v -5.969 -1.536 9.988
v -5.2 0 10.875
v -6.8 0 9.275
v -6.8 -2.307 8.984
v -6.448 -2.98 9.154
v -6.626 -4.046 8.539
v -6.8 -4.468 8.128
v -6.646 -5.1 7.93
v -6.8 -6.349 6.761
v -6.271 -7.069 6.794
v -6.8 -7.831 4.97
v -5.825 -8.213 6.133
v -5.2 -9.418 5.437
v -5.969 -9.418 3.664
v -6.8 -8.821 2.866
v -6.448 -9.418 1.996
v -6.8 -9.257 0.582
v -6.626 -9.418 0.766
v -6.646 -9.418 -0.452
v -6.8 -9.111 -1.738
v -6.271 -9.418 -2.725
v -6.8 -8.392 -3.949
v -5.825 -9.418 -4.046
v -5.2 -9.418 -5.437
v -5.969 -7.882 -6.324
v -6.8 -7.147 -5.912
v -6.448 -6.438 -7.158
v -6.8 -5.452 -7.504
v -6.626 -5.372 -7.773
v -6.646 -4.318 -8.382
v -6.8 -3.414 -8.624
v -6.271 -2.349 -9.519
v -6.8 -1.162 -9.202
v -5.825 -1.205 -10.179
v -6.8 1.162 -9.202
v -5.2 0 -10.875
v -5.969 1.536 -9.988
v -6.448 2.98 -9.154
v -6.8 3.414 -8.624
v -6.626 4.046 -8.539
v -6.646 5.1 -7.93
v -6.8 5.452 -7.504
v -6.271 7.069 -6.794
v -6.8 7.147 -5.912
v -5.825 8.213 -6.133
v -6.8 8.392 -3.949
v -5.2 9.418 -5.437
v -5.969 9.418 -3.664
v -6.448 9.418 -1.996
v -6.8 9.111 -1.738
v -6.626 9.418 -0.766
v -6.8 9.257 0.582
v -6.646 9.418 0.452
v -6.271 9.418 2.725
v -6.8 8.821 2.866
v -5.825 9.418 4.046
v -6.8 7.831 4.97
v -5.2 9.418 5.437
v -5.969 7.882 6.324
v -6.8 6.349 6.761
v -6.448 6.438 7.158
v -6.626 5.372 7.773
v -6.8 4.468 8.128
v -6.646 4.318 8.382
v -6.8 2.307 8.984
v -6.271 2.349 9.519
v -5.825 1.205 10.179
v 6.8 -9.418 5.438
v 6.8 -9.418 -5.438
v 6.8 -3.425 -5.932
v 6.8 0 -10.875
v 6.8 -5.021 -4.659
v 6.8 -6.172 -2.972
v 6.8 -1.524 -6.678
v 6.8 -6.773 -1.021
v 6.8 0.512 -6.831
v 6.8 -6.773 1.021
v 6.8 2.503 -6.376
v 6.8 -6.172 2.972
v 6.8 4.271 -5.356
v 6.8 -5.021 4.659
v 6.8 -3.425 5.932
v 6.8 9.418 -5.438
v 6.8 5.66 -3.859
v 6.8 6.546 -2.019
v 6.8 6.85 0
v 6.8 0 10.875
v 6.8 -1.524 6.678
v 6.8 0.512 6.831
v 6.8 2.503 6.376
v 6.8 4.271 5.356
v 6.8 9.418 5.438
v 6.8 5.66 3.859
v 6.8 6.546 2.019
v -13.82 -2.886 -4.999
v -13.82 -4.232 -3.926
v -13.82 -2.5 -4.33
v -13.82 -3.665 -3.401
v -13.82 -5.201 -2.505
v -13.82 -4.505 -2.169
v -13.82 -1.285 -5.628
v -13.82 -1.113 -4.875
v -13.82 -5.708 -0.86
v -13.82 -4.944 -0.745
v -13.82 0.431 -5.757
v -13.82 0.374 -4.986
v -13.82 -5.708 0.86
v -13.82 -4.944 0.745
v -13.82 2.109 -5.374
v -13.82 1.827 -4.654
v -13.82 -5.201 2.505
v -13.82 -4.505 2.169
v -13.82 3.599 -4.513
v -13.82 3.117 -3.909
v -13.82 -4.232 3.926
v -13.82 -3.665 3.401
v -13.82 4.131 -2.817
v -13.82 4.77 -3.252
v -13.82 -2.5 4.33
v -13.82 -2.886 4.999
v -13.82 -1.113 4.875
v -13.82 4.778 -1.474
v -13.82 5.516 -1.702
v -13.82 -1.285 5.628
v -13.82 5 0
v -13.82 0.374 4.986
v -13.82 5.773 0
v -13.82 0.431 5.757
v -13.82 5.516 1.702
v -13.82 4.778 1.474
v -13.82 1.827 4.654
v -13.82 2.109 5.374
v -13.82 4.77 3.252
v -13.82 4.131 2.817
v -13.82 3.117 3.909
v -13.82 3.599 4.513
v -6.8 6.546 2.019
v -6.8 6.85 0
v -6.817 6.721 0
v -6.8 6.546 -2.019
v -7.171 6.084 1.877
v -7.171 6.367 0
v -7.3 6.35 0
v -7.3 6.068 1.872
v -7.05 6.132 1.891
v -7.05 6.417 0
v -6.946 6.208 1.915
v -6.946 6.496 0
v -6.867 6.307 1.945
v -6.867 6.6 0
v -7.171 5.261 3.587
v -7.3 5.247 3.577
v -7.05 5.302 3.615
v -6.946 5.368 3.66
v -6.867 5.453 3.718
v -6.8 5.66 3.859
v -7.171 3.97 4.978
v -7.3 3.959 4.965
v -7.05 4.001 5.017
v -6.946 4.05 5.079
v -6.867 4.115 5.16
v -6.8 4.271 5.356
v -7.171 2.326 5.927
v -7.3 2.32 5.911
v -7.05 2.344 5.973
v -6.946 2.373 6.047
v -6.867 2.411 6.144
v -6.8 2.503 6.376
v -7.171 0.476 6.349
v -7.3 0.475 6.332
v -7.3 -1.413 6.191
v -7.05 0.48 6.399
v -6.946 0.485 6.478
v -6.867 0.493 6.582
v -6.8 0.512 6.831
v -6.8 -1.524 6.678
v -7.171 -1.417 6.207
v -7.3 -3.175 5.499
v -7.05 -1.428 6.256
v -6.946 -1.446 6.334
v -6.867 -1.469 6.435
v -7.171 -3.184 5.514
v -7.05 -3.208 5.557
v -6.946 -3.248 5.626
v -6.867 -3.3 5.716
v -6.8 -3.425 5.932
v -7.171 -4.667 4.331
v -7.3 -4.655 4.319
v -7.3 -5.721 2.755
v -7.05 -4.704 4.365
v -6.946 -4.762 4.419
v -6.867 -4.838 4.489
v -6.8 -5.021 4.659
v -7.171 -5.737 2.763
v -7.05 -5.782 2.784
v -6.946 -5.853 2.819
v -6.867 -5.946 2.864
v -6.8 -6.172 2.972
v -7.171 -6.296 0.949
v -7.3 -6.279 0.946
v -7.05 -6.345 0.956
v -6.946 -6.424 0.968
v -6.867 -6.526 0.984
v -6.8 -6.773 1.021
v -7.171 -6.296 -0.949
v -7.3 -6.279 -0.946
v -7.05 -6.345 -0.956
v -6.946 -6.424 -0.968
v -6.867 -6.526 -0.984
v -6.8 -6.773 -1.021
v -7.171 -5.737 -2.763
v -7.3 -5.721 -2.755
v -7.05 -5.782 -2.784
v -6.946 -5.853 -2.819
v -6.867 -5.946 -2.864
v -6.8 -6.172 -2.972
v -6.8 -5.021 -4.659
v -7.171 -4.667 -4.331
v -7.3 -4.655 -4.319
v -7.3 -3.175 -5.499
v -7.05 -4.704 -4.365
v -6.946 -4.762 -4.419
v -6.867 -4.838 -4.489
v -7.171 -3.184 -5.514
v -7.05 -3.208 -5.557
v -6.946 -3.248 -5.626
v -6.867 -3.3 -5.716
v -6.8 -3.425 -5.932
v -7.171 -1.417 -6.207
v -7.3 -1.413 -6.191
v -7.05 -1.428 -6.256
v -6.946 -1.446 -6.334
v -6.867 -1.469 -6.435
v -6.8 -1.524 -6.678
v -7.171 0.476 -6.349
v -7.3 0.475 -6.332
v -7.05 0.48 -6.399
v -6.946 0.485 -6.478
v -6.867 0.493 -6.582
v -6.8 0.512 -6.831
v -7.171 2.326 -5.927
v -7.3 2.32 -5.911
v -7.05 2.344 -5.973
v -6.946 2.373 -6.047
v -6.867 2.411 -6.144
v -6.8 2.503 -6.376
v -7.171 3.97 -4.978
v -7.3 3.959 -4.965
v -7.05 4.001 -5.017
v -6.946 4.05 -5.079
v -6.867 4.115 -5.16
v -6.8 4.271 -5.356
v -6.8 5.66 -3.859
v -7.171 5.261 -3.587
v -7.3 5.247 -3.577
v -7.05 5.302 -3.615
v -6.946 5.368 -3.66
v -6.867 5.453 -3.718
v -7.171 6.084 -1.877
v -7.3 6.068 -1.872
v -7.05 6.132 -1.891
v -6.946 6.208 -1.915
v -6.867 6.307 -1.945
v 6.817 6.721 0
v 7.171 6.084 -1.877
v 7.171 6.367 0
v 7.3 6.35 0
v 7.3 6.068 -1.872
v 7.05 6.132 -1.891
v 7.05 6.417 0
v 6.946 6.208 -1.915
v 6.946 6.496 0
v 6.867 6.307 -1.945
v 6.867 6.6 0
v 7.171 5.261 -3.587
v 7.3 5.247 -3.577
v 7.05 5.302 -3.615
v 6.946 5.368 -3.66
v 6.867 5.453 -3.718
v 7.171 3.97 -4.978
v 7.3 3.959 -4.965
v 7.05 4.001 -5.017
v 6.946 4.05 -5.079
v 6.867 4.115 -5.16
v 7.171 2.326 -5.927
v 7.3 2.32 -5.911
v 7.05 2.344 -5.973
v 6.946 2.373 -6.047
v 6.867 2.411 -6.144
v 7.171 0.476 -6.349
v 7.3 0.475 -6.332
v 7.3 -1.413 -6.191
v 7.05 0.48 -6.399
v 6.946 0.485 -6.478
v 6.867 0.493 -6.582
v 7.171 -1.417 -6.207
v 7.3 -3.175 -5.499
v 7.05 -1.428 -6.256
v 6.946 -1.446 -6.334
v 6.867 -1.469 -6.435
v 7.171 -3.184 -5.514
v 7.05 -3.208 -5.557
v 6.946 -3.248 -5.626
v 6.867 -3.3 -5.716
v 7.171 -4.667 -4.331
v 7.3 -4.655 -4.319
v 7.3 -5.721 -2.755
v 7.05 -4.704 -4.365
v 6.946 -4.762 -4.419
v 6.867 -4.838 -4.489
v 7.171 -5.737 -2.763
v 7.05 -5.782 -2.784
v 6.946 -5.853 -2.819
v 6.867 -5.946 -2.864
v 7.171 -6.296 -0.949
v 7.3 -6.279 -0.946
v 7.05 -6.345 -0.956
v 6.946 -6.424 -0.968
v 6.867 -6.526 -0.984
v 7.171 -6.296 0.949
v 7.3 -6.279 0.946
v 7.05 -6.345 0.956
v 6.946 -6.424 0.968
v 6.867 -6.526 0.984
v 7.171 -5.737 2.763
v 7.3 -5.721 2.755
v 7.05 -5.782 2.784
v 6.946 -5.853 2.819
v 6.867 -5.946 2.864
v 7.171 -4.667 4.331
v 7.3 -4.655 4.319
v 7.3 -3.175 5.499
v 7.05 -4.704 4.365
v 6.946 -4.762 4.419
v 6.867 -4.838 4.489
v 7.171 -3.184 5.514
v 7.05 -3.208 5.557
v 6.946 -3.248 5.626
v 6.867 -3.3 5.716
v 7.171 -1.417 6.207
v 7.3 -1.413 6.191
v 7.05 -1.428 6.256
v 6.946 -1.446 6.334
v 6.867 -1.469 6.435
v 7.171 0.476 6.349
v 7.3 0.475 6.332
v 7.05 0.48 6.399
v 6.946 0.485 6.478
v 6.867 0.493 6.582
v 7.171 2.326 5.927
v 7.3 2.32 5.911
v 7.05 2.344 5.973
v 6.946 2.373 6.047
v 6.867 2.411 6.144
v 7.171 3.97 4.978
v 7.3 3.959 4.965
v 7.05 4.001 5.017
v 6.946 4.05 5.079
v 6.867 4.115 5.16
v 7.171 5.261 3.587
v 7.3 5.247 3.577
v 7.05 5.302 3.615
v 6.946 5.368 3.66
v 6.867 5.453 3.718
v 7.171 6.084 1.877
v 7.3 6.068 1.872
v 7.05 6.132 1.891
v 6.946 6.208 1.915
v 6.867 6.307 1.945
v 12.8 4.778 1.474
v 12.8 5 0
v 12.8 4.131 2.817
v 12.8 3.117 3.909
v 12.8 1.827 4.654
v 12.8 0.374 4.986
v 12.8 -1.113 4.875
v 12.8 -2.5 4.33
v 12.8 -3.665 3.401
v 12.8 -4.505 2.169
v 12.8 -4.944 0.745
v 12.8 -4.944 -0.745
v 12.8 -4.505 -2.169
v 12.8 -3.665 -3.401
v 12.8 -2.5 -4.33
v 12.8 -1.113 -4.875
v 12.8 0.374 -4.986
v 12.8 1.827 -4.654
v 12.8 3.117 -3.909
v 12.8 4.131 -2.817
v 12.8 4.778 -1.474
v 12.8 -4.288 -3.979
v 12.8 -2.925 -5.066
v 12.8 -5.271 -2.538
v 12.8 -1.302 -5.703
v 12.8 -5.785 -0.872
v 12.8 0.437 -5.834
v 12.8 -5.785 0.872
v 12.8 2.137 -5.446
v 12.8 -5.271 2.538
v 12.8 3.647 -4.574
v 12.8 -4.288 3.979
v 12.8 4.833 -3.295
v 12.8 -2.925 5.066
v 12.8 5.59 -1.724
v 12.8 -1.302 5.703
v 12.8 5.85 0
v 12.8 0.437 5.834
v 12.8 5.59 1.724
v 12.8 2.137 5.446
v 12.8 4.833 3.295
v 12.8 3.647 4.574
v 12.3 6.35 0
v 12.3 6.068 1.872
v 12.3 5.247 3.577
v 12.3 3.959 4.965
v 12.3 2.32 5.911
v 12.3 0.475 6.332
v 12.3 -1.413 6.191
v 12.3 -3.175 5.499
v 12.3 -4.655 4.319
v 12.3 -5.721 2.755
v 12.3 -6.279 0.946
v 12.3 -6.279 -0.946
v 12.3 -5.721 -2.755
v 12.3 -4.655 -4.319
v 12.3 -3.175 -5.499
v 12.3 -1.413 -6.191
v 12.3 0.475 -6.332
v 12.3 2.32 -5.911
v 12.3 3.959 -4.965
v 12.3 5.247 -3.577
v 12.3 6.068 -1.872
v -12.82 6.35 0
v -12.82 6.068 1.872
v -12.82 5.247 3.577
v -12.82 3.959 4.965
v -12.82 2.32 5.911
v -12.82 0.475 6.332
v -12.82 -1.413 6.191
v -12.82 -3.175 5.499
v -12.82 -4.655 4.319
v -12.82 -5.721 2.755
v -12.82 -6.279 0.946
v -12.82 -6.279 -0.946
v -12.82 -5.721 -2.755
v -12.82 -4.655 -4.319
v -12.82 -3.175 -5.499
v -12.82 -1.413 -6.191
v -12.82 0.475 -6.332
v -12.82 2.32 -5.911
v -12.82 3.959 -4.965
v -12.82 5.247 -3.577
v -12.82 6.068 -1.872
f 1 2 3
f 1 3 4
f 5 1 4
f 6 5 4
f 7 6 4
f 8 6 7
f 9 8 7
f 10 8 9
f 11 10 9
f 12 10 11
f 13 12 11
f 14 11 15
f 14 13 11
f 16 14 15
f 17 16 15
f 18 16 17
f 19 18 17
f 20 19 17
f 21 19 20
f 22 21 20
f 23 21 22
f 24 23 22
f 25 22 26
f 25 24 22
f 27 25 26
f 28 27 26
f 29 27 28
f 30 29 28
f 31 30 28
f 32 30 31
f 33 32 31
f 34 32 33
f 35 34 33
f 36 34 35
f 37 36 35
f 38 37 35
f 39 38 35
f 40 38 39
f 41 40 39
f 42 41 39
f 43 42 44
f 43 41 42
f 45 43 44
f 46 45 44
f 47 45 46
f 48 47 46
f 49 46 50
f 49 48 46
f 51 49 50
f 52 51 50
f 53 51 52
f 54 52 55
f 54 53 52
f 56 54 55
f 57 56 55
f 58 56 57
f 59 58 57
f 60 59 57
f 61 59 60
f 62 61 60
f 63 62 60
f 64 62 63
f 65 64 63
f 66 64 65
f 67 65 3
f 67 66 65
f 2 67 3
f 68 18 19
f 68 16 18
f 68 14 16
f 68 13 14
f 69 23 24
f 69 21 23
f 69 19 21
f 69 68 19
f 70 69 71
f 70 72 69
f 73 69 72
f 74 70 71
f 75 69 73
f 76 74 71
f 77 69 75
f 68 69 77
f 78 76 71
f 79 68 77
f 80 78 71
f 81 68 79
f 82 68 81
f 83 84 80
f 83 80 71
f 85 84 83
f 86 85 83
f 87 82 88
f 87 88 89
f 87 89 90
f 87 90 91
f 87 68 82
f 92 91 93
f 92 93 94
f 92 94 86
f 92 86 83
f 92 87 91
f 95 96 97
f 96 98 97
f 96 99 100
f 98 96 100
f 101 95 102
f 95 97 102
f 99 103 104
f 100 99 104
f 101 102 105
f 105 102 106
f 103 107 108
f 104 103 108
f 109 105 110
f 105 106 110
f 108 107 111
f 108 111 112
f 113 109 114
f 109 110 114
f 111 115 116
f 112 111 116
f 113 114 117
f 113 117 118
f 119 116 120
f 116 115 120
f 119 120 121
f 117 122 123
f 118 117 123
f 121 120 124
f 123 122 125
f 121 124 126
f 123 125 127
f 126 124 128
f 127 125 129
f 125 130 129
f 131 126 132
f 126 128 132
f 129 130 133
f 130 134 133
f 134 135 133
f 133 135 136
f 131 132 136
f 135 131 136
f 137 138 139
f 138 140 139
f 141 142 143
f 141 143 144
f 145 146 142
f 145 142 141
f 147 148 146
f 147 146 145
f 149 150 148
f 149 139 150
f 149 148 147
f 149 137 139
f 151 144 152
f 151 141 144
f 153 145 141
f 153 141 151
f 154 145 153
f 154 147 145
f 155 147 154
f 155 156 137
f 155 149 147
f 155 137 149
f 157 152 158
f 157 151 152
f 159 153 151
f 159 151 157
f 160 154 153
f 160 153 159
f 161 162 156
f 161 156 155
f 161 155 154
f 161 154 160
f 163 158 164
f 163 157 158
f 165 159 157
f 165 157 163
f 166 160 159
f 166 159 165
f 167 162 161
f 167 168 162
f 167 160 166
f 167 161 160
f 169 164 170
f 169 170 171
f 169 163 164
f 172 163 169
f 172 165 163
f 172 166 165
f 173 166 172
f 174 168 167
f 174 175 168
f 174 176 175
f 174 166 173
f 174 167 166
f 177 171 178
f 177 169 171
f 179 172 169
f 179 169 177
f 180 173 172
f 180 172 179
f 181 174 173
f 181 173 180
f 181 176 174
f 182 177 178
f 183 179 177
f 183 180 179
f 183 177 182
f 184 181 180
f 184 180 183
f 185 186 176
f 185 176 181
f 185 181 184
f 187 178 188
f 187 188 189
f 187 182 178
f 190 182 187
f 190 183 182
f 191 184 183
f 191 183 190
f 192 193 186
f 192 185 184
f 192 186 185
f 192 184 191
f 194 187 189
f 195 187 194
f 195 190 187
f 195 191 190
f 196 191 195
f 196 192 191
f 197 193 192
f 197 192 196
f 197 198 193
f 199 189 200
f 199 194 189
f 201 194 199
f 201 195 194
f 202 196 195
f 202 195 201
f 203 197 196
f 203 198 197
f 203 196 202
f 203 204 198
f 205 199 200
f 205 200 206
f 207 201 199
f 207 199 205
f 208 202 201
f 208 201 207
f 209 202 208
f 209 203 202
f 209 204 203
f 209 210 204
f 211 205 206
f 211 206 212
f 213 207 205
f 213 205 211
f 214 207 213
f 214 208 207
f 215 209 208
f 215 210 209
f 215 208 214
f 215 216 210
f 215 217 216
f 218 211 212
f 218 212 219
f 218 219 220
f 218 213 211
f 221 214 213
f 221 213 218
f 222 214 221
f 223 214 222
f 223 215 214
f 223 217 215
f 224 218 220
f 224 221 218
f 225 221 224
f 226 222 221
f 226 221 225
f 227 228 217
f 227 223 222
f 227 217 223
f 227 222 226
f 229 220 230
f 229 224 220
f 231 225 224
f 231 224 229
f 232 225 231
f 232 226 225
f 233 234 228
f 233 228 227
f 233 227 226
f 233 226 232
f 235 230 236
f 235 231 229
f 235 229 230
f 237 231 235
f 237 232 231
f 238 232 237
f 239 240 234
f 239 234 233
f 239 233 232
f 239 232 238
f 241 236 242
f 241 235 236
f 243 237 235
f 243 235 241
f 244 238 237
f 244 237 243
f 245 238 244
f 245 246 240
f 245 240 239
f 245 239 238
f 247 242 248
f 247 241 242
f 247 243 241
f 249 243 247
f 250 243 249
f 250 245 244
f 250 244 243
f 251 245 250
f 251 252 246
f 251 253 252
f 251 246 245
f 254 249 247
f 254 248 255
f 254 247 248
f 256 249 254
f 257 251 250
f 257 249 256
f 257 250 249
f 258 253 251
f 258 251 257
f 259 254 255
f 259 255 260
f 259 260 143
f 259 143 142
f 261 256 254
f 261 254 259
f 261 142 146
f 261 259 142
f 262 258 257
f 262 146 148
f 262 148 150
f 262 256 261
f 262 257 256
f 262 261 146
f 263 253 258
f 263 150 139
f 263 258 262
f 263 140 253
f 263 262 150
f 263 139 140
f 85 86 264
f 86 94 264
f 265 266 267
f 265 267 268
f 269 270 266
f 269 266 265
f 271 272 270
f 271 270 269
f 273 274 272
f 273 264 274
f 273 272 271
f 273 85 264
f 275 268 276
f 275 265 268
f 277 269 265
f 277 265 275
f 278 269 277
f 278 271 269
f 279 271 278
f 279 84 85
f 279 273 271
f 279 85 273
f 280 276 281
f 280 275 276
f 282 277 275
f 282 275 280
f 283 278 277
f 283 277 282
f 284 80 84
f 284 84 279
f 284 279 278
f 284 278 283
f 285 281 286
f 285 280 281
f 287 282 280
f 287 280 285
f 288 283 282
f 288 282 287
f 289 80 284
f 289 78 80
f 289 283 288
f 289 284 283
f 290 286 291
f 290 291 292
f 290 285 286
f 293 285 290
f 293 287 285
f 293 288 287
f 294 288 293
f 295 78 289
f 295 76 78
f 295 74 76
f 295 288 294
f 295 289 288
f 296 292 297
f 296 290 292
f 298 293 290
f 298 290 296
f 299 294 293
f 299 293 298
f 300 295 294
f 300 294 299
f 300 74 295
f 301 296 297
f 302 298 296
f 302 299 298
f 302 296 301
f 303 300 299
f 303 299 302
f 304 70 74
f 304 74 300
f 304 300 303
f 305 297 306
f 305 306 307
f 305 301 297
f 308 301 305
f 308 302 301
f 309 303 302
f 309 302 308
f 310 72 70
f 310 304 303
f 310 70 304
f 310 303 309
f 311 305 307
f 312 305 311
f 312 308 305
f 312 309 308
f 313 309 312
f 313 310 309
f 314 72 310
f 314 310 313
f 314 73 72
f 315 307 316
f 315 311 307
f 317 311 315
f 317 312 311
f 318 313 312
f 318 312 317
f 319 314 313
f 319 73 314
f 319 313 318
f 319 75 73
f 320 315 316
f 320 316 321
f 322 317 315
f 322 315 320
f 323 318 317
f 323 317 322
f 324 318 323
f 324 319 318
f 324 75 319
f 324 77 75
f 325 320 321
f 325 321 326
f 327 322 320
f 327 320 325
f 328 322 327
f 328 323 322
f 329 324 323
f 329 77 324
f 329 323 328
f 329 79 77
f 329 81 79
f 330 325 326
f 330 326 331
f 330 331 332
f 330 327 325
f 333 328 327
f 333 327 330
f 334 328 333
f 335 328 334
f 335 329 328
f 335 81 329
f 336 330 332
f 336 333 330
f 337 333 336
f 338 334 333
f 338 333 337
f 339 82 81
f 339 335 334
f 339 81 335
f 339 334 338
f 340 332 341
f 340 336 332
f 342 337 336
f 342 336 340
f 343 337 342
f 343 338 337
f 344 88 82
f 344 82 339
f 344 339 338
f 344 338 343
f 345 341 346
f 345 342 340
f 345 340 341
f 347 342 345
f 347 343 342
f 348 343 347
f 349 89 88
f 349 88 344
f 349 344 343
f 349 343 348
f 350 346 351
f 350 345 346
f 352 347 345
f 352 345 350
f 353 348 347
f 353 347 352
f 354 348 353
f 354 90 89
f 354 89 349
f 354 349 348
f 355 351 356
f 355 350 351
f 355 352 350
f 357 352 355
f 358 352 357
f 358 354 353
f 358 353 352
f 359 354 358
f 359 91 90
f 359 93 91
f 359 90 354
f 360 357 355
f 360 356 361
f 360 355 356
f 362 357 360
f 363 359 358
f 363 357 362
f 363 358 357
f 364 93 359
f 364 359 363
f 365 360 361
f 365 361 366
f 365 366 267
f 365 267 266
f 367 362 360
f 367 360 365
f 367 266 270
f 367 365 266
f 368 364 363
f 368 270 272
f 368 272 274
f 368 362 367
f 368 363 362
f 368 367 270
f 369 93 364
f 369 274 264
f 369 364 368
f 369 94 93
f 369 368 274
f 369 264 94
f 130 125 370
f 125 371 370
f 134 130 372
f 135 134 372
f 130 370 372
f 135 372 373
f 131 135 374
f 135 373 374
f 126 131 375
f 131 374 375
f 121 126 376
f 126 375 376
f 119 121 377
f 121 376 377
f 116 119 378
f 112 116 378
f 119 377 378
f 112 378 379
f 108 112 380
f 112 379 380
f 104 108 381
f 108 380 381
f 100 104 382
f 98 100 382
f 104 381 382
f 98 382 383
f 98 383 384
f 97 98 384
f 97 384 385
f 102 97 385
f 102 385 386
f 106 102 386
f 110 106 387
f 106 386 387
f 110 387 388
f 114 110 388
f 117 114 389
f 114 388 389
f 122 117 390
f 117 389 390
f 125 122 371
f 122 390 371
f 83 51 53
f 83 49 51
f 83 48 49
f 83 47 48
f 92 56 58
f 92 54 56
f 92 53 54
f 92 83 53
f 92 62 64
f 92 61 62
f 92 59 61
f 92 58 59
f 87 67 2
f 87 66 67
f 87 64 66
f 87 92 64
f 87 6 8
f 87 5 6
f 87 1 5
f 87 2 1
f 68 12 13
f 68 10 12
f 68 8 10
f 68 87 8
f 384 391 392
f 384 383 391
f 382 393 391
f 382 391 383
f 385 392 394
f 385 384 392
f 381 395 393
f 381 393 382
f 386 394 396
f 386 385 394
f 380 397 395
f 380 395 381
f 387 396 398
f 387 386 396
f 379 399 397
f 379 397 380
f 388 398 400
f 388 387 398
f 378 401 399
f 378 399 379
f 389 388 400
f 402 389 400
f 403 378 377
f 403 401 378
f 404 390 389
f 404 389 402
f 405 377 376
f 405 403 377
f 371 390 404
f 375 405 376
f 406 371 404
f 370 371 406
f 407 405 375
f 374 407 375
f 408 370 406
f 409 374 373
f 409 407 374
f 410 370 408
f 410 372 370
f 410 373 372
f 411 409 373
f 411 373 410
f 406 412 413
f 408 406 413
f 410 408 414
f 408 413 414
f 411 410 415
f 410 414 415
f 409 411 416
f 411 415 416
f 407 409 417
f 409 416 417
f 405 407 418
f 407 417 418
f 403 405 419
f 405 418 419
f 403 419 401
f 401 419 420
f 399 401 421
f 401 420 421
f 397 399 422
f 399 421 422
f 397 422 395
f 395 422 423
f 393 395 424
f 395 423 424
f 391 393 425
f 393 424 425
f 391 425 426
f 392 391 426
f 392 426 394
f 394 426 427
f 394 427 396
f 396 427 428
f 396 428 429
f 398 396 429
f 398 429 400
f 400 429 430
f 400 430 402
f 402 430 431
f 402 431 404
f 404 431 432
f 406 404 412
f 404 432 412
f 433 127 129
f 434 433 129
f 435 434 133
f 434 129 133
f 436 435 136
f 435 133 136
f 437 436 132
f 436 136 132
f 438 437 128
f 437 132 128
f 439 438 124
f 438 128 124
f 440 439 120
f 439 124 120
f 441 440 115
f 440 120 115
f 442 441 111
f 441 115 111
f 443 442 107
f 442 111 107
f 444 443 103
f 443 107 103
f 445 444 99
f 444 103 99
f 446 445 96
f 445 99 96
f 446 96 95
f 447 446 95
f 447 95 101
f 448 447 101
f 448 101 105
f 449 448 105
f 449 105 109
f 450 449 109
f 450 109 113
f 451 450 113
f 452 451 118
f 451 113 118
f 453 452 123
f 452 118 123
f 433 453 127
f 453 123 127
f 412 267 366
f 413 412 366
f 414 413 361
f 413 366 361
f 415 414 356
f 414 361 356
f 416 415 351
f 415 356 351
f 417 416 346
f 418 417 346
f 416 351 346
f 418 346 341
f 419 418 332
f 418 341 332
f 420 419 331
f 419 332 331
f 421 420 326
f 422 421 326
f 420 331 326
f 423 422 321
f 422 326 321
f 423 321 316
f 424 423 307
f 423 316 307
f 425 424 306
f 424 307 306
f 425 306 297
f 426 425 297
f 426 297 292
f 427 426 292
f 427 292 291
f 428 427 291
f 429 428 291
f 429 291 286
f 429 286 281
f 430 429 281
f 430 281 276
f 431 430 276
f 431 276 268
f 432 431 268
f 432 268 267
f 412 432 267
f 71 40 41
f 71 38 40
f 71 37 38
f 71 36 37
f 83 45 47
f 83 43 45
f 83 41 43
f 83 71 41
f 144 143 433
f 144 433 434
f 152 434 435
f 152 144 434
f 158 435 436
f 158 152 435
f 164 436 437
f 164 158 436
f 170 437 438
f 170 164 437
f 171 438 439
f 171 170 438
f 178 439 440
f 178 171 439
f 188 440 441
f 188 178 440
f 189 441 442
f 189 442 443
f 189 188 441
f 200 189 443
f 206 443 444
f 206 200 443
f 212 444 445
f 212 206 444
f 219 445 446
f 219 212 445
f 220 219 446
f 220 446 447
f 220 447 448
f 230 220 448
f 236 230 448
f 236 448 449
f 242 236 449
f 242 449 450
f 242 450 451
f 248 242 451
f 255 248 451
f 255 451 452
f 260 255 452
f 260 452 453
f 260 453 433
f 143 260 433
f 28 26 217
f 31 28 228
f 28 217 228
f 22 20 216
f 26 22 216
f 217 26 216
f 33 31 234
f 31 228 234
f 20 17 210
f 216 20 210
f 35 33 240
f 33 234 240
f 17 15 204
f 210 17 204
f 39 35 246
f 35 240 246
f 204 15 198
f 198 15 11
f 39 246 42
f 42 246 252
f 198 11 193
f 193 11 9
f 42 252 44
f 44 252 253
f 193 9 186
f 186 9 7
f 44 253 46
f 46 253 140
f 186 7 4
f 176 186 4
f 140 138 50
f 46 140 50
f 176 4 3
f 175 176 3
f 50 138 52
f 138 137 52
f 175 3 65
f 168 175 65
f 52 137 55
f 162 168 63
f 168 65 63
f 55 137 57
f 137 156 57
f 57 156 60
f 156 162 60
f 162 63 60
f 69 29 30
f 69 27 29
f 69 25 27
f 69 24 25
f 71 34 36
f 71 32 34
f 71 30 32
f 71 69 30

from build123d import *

# Parameters (mm, degrees)
F0_R          = 6.35
F1_DEPTH      = 6.8
F1_DEPTH_BACK = 6.8
F2_DEPTH      = 13.82
F2_DEPTH_BACK = 12.8
F5_R          = 5
F6_DEPTH      = 15
F7_SIZE2      = 0.5773502692
F7_SIZE       = 1
F8_SIZE       = 0.5
F9_R          = 0.5


with BuildPart() as f1:
    # F0 (on Right) → F1 (new body, two sides)
    with BuildSketch(Plane.YZ) as f1_sk:
        Polygon((9.4180262662, 5.4375), (0, 10.875), (-9.4180262662, 5.4375), (-9.4180262662, -5.4375), (0, -10.875), (9.4180262662, -5.4375), align=None)
        Circle(F0_R, mode=Mode.SUBTRACT)
        Circle(F0_R)
    extrude(amount=F1_DEPTH)
    extrude(f1_sk.sketch, amount=-F1_DEPTH_BACK)

    # F0 (on Right) → F2 (join, two sides)
    with BuildSketch(Plane.YZ) as f2_sk:
        Circle(F0_R)
    extrude(amount=-F2_DEPTH)
    extrude(f2_sk.sketch, amount=F2_DEPTH_BACK)

    # F3 (on Front) → F4 (revolve, cut)
    with BuildSketch(Plane.XZ):
        Polygon((-6.8, 9.275), (-5.2, 10.875), (-6.8, 10.875), align=None)
    revolve(axis=Axis((0, 0, 0), (1, 0, 0)), mode=Mode.SUBTRACT)

    # F5 (on Right) → F6 (cut, symmetric)
    with BuildSketch(Plane.YZ):
        Circle(F5_R)
    extrude(amount=F6_DEPTH, both=True, mode=Mode.SUBTRACT)

    # F7
    f7_edges = [f1.edges().sort_by_distance(p)[0] for p in [
        (-13.82, -6.35, 0),
    ]]
    f7_side = f1.faces().sort_by_distance((-10.31, -6.35, 0))[0]
    chamfer(f7_edges, length=F7_SIZE, length2=F7_SIZE2, reference=f7_side)

    # F8
    f8_edges = [f1.edges().sort_by_distance(p)[0] for p in [
        (12.8, -6.35, 0),
    ]]
    chamfer(f8_edges, length=F8_SIZE)

    # F9
    f9_edges = [f1.edges().sort_by_distance(p)[0] for p in [
        (6.8, -6.35, 0),
        (-6.8, -6.35, 0),
    ]]
    fillet(f9_edges, radius=F9_R)


solid = f1.part
